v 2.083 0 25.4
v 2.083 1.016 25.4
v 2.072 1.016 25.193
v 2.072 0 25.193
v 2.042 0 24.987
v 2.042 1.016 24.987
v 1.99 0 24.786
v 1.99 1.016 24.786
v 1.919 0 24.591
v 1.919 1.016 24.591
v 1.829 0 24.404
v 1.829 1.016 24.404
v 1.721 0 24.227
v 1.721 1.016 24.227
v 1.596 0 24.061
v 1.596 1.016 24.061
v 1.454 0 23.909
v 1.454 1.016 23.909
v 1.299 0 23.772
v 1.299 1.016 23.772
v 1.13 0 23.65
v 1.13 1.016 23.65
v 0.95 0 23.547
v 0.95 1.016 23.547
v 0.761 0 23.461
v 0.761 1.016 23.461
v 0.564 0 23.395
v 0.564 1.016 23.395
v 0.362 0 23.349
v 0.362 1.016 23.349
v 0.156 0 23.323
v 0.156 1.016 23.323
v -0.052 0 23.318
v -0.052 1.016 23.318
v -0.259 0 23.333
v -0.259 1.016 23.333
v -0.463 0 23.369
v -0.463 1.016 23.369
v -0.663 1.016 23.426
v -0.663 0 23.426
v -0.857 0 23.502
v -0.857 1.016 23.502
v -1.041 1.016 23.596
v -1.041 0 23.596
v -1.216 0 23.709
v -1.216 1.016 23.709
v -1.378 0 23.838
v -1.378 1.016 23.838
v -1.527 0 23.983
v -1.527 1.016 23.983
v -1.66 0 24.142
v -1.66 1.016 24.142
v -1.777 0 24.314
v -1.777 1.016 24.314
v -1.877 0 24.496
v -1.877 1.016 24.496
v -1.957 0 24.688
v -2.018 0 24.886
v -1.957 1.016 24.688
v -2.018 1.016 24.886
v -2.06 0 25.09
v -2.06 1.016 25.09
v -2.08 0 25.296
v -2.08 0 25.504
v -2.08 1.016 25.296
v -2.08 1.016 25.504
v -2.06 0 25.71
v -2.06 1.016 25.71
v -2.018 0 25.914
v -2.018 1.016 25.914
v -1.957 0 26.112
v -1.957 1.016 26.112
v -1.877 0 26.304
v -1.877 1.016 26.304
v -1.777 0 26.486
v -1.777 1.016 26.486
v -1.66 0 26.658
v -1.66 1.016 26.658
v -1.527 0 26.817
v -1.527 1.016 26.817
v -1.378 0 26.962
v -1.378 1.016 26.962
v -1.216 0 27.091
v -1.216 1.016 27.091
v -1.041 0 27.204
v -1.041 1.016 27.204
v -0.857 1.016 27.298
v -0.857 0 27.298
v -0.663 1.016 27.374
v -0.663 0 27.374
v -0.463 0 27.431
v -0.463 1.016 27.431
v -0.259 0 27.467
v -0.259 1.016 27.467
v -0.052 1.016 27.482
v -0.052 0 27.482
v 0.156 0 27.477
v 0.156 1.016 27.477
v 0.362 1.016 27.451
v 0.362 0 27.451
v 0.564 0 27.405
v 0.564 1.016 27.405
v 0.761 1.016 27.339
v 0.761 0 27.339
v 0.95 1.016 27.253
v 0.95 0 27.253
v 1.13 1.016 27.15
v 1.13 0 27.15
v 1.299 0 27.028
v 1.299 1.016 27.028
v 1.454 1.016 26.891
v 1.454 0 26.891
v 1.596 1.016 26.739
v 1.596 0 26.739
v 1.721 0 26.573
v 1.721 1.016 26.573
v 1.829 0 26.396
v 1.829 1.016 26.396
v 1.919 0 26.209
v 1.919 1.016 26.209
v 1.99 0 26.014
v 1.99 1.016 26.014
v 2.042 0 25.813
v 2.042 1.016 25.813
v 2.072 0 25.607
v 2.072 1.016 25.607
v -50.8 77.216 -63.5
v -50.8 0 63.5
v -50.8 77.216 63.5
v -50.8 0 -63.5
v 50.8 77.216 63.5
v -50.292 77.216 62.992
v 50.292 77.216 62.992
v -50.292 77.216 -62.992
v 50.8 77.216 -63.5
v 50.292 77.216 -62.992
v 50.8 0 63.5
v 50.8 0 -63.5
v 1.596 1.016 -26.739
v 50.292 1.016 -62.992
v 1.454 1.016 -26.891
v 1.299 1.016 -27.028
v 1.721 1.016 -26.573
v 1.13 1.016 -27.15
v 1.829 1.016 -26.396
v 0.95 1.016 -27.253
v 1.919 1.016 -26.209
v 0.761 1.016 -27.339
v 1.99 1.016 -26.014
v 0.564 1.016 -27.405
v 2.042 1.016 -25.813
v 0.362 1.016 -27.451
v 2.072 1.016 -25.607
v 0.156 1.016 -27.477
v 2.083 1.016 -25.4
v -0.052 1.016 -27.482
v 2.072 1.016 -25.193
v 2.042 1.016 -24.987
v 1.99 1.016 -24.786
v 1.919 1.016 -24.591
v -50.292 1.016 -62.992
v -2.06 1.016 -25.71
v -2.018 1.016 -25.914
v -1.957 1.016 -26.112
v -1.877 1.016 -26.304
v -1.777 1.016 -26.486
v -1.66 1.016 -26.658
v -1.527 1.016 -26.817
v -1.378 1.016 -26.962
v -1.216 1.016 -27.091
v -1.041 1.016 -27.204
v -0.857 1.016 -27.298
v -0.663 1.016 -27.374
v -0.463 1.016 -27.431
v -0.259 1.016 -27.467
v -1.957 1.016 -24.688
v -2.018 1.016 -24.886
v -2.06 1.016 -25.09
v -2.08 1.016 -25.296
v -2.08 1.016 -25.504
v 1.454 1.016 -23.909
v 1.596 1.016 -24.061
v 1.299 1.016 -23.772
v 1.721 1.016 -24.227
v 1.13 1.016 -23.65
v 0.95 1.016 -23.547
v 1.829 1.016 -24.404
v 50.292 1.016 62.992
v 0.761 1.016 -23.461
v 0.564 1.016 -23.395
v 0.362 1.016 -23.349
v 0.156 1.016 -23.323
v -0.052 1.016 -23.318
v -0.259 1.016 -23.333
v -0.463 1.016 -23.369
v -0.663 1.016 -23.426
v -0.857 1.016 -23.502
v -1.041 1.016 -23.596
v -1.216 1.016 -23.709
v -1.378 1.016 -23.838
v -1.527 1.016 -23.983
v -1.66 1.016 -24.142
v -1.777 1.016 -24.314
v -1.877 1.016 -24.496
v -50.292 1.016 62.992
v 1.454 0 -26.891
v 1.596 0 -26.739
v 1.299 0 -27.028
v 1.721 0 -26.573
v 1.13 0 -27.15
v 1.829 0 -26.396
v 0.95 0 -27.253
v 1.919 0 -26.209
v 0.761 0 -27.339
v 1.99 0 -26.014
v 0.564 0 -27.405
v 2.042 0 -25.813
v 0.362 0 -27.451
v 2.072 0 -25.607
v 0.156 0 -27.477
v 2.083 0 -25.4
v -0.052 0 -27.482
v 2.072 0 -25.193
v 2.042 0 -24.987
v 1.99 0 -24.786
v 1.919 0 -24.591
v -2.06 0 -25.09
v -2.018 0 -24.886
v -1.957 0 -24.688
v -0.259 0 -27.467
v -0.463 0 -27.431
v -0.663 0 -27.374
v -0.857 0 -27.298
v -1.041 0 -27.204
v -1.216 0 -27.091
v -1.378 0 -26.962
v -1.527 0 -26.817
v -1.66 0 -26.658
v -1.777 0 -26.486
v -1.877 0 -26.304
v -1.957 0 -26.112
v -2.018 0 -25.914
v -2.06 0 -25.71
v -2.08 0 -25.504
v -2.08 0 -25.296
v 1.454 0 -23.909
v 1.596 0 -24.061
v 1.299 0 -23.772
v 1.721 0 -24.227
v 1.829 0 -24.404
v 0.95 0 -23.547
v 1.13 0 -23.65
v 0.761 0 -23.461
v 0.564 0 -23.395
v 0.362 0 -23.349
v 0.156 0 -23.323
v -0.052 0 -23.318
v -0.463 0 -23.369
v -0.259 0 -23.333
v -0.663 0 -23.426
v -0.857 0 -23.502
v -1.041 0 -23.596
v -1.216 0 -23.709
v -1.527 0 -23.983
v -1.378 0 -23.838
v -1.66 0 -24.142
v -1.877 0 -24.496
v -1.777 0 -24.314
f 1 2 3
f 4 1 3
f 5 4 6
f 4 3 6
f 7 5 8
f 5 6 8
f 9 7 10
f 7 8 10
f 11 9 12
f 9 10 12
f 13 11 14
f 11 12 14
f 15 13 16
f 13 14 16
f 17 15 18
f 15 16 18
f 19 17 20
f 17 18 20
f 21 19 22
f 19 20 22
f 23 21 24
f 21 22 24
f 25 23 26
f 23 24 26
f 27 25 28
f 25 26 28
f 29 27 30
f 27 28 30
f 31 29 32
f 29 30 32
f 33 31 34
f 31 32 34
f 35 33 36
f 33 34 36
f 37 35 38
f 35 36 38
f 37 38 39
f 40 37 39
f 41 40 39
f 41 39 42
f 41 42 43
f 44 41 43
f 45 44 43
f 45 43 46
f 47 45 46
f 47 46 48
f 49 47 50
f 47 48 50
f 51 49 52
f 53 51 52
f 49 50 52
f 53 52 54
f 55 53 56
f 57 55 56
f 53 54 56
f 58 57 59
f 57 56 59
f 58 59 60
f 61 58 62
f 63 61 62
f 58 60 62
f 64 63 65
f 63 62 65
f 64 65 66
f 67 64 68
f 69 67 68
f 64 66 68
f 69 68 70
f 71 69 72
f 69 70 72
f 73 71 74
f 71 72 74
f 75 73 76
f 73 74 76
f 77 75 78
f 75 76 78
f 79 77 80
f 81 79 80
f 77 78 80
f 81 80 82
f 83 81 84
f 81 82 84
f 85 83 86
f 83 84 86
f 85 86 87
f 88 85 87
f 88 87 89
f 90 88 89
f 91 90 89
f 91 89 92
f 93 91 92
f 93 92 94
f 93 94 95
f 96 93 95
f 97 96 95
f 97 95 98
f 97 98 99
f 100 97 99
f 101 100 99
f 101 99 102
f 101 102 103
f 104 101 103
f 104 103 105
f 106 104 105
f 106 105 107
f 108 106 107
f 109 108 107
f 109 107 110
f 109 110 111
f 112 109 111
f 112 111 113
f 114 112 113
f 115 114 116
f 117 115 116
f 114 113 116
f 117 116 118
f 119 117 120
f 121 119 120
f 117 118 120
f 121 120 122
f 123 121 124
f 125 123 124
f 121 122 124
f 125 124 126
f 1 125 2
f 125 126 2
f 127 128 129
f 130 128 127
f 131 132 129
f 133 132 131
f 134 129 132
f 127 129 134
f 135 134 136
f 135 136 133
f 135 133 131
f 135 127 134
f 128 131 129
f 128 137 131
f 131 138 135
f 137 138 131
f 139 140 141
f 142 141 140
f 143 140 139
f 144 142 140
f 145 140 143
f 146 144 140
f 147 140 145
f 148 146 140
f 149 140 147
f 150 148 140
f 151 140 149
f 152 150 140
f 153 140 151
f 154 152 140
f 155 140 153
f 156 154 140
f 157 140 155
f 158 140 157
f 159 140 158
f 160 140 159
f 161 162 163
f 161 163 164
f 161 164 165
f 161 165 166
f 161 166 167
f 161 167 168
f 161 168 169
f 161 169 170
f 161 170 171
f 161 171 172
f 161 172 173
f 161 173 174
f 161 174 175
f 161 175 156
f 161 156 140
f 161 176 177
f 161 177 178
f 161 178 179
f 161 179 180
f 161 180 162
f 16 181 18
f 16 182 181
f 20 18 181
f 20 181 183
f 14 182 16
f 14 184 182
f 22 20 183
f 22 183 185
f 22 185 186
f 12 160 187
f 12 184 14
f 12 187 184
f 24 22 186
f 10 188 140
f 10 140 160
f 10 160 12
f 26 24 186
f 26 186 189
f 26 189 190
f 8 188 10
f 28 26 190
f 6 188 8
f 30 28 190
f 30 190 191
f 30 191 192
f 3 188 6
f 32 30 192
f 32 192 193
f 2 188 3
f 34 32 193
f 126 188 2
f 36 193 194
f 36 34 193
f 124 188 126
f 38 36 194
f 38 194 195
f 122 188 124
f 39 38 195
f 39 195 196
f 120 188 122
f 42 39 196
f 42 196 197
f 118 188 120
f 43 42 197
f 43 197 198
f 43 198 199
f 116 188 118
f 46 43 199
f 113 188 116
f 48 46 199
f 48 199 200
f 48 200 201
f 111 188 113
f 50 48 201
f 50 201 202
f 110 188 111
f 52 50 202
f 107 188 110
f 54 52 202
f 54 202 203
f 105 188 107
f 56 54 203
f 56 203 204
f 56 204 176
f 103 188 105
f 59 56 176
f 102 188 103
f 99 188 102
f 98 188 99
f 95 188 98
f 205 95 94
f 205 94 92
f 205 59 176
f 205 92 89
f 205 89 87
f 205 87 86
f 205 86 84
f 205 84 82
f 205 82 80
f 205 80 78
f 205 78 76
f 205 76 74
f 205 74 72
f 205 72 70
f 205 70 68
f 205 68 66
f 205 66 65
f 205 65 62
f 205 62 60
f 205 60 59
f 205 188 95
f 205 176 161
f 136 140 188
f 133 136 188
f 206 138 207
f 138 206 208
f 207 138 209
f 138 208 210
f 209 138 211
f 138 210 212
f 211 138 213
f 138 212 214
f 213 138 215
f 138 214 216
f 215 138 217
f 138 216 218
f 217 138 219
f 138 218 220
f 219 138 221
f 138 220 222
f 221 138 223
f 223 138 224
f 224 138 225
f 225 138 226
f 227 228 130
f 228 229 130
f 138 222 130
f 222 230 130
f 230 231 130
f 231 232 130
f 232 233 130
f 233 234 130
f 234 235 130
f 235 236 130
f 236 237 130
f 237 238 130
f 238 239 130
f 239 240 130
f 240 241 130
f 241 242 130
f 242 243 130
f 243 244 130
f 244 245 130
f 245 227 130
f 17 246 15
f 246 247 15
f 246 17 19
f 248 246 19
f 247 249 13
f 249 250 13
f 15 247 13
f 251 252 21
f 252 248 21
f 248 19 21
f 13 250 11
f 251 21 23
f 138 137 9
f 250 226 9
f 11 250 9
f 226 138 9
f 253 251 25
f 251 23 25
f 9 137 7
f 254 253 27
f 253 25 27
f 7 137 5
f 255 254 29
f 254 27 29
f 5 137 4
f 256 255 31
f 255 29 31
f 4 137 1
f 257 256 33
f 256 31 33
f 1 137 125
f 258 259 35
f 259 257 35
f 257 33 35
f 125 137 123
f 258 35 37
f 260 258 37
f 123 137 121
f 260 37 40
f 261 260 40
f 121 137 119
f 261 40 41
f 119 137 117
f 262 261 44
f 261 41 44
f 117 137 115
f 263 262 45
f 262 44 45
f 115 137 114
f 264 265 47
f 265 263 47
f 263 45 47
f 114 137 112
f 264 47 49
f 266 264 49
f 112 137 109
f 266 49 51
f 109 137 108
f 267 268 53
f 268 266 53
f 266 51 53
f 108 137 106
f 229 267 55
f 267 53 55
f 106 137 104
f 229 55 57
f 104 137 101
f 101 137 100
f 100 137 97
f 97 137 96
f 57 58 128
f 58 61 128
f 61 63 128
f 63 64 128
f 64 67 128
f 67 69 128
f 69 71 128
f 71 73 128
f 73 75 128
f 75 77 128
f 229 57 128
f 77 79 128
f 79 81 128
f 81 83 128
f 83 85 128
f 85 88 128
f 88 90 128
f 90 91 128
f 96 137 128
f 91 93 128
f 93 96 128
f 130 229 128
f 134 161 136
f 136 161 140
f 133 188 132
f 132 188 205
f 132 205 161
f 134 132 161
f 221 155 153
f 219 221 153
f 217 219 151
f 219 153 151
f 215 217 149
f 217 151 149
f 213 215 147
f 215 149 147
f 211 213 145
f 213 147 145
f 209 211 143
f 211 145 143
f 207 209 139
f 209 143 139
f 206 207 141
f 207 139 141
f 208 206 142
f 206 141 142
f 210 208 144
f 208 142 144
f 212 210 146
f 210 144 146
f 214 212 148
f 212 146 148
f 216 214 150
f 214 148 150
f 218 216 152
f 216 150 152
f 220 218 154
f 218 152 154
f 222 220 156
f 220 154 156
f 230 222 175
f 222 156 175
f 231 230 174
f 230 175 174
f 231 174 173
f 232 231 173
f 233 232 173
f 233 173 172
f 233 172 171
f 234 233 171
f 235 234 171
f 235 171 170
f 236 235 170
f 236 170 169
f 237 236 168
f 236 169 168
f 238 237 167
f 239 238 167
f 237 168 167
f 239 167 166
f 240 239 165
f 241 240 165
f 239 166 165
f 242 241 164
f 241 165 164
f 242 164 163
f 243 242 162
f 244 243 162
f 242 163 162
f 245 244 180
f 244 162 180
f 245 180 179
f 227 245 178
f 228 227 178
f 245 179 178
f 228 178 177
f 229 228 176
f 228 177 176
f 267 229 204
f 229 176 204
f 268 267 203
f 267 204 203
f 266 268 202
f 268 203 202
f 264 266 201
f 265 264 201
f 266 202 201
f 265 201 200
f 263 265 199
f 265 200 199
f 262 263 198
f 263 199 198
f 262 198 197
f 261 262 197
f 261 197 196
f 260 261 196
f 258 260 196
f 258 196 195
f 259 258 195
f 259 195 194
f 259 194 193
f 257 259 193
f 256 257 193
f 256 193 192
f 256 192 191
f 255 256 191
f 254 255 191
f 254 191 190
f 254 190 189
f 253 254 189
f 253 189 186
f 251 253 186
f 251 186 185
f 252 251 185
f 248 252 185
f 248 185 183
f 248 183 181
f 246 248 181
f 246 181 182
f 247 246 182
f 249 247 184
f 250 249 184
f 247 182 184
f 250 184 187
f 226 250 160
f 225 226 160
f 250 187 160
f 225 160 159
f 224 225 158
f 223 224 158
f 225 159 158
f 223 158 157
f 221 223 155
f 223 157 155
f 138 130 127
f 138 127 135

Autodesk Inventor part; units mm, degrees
ref_plane "YZ Plane" through (0, 0, 0) normal (1, 0, 0) x (0, 1, 0)
ref_plane "XZ Plane" through (0, 0, 0) normal (0, 1, 0) x (-1, 0, 0)
ref_plane "XY Plane" through (0, 0, 0) normal (0, 0, 1) x (1, 0, 0)
sketch "Sketch1" plane through (0, 0, 0) normal (0, 1, 0) x (-1, 0, 0)
  line L0 (-50.8, 63.5) -> (50.8, 63.5)
  line L1 (50.8, 63.5) -> (50.8, -63.5)
  line L2 (50.8, -63.5) -> (-50.8, -63.5)
  line L3 (-50.8, -63.5) -> (-50.8, 63.5)
  line L4 (-50.8, 63.5) -> (50.8, -63.5) construction
  line L5 (50.8, 63.5) -> (-50.8, -63.5) construction
  point P0 (0, 0)
  dimension "d0" = 101.6
  dimension "d1" = 127
extrude "Extrusion1" add sketch "Sketch1" along normal blind 1.016
sketch "Sketch2" plane through (0, 1.016, 0) normal (0, 1, 0) x (1, 0, 0)
  line L0 (50.8, 63.5) -> (-50.8, 63.5) projected
  line L1 (50.8, -63.5) -> (-50.8, -63.5)
  line L2 (-50.8, -63.5) -> (-50.8, 63.5)
  line L3 (-50.8, 63.5) -> (50.8, 63.5)
  line L4 (50.8, 63.5) -> (50.8, -63.5)
  line L5 (50.8, -63.5) -> (-50.8, 63.5) construction
  line L6 (-50.8, -63.5) -> (50.8, 63.5) construction
  line L7 (50.292, -62.992) -> (-50.292, -62.992)
  line L8 (-50.292, -62.992) -> (-50.292, 62.992)
  line L9 (-50.292, 62.992) -> (50.292, 62.992)
  line L10 (50.292, 62.992) -> (50.292, -62.992)
  line L11 (50.292, -62.992) -> (-50.292, 62.992) construction
  line L12 (-50.292, -62.992) -> (50.292, 62.992) construction
  point P0 (0, 0)
  dimension "d4" = 100.584
  dimension "d5" = 125.984
extrude "Extrusion2" add sketch "Sketch2" along normal blind 76.2
sketch "Sketch3" plane through (0, 1.016, 0) normal (0, 1, 0) x (1, 0, 0)
  line L0 (0, 0) -> (0, -25.4)
  line L1 (0, -25.4) -> (0, 25.4)
  circle A0 centre (0, -25.4) radius 2.0828
  circle A1 centre (0, 25.4) radius 2.0828
  dimension "d8" = 25.4
  dimension "d9" = 50.8
  dimension "d10" = 4.1656
  dimension "d11" = 4.1656
extrude "Extrusion3" cut sketch "Sketch3" against normal through all
properties part number "563-AU1028MG-5x4-Enclosure"
